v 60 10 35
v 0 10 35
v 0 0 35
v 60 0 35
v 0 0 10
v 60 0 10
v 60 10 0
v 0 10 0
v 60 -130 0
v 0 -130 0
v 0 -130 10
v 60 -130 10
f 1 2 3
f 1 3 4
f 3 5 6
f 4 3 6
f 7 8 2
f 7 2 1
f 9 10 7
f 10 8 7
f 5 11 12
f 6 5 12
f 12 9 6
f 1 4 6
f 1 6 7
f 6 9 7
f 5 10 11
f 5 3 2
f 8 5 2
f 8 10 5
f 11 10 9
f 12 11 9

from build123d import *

# Parameters (mm, degrees)
BOX002_W     = 60
BOX002_H     = 40
BOX002_DEPTH = 10
BOX001_W     = 60
BOX001_H     = 10
BOX001_DEPTH = 25
BOX_W        = 60
BOX_H        = 100
BOX_DEPTH    = 10


with BuildPart() as cubo002:
    # Box002 → Box002 (new body)
    with BuildSketch(Plane(origin=(0, -130, 0), x_dir=(1, 0, 0), z_dir=(0, 0, 1))):
        with Locations((30, 20)):
            Rectangle(BOX002_W, BOX002_H)
    extrude(amount=BOX002_DEPTH)


with BuildPart() as cubo001:
    # Box001 → Box001 (new body)
    with BuildSketch(Plane.XY.offset(10)):
        with Locations((30, 5)):
            Rectangle(BOX001_W, BOX001_H)
    extrude(amount=BOX001_DEPTH)


with BuildPart() as fusion001:
    # Box → Box (new body)
    with BuildSketch(Plane(origin=(0, -90, 0), x_dir=(1, 0, 0), z_dir=(0, 0, 1))):
        with Locations((30, 50)):
            Rectangle(BOX_W, BOX_H)
    extrude(amount=BOX_DEPTH)

    # Fusion: union Cubo001
    add(cubo001.part)

    # Fusion001: union Cubo002
    add(cubo002.part)


solid = fusion001.part
